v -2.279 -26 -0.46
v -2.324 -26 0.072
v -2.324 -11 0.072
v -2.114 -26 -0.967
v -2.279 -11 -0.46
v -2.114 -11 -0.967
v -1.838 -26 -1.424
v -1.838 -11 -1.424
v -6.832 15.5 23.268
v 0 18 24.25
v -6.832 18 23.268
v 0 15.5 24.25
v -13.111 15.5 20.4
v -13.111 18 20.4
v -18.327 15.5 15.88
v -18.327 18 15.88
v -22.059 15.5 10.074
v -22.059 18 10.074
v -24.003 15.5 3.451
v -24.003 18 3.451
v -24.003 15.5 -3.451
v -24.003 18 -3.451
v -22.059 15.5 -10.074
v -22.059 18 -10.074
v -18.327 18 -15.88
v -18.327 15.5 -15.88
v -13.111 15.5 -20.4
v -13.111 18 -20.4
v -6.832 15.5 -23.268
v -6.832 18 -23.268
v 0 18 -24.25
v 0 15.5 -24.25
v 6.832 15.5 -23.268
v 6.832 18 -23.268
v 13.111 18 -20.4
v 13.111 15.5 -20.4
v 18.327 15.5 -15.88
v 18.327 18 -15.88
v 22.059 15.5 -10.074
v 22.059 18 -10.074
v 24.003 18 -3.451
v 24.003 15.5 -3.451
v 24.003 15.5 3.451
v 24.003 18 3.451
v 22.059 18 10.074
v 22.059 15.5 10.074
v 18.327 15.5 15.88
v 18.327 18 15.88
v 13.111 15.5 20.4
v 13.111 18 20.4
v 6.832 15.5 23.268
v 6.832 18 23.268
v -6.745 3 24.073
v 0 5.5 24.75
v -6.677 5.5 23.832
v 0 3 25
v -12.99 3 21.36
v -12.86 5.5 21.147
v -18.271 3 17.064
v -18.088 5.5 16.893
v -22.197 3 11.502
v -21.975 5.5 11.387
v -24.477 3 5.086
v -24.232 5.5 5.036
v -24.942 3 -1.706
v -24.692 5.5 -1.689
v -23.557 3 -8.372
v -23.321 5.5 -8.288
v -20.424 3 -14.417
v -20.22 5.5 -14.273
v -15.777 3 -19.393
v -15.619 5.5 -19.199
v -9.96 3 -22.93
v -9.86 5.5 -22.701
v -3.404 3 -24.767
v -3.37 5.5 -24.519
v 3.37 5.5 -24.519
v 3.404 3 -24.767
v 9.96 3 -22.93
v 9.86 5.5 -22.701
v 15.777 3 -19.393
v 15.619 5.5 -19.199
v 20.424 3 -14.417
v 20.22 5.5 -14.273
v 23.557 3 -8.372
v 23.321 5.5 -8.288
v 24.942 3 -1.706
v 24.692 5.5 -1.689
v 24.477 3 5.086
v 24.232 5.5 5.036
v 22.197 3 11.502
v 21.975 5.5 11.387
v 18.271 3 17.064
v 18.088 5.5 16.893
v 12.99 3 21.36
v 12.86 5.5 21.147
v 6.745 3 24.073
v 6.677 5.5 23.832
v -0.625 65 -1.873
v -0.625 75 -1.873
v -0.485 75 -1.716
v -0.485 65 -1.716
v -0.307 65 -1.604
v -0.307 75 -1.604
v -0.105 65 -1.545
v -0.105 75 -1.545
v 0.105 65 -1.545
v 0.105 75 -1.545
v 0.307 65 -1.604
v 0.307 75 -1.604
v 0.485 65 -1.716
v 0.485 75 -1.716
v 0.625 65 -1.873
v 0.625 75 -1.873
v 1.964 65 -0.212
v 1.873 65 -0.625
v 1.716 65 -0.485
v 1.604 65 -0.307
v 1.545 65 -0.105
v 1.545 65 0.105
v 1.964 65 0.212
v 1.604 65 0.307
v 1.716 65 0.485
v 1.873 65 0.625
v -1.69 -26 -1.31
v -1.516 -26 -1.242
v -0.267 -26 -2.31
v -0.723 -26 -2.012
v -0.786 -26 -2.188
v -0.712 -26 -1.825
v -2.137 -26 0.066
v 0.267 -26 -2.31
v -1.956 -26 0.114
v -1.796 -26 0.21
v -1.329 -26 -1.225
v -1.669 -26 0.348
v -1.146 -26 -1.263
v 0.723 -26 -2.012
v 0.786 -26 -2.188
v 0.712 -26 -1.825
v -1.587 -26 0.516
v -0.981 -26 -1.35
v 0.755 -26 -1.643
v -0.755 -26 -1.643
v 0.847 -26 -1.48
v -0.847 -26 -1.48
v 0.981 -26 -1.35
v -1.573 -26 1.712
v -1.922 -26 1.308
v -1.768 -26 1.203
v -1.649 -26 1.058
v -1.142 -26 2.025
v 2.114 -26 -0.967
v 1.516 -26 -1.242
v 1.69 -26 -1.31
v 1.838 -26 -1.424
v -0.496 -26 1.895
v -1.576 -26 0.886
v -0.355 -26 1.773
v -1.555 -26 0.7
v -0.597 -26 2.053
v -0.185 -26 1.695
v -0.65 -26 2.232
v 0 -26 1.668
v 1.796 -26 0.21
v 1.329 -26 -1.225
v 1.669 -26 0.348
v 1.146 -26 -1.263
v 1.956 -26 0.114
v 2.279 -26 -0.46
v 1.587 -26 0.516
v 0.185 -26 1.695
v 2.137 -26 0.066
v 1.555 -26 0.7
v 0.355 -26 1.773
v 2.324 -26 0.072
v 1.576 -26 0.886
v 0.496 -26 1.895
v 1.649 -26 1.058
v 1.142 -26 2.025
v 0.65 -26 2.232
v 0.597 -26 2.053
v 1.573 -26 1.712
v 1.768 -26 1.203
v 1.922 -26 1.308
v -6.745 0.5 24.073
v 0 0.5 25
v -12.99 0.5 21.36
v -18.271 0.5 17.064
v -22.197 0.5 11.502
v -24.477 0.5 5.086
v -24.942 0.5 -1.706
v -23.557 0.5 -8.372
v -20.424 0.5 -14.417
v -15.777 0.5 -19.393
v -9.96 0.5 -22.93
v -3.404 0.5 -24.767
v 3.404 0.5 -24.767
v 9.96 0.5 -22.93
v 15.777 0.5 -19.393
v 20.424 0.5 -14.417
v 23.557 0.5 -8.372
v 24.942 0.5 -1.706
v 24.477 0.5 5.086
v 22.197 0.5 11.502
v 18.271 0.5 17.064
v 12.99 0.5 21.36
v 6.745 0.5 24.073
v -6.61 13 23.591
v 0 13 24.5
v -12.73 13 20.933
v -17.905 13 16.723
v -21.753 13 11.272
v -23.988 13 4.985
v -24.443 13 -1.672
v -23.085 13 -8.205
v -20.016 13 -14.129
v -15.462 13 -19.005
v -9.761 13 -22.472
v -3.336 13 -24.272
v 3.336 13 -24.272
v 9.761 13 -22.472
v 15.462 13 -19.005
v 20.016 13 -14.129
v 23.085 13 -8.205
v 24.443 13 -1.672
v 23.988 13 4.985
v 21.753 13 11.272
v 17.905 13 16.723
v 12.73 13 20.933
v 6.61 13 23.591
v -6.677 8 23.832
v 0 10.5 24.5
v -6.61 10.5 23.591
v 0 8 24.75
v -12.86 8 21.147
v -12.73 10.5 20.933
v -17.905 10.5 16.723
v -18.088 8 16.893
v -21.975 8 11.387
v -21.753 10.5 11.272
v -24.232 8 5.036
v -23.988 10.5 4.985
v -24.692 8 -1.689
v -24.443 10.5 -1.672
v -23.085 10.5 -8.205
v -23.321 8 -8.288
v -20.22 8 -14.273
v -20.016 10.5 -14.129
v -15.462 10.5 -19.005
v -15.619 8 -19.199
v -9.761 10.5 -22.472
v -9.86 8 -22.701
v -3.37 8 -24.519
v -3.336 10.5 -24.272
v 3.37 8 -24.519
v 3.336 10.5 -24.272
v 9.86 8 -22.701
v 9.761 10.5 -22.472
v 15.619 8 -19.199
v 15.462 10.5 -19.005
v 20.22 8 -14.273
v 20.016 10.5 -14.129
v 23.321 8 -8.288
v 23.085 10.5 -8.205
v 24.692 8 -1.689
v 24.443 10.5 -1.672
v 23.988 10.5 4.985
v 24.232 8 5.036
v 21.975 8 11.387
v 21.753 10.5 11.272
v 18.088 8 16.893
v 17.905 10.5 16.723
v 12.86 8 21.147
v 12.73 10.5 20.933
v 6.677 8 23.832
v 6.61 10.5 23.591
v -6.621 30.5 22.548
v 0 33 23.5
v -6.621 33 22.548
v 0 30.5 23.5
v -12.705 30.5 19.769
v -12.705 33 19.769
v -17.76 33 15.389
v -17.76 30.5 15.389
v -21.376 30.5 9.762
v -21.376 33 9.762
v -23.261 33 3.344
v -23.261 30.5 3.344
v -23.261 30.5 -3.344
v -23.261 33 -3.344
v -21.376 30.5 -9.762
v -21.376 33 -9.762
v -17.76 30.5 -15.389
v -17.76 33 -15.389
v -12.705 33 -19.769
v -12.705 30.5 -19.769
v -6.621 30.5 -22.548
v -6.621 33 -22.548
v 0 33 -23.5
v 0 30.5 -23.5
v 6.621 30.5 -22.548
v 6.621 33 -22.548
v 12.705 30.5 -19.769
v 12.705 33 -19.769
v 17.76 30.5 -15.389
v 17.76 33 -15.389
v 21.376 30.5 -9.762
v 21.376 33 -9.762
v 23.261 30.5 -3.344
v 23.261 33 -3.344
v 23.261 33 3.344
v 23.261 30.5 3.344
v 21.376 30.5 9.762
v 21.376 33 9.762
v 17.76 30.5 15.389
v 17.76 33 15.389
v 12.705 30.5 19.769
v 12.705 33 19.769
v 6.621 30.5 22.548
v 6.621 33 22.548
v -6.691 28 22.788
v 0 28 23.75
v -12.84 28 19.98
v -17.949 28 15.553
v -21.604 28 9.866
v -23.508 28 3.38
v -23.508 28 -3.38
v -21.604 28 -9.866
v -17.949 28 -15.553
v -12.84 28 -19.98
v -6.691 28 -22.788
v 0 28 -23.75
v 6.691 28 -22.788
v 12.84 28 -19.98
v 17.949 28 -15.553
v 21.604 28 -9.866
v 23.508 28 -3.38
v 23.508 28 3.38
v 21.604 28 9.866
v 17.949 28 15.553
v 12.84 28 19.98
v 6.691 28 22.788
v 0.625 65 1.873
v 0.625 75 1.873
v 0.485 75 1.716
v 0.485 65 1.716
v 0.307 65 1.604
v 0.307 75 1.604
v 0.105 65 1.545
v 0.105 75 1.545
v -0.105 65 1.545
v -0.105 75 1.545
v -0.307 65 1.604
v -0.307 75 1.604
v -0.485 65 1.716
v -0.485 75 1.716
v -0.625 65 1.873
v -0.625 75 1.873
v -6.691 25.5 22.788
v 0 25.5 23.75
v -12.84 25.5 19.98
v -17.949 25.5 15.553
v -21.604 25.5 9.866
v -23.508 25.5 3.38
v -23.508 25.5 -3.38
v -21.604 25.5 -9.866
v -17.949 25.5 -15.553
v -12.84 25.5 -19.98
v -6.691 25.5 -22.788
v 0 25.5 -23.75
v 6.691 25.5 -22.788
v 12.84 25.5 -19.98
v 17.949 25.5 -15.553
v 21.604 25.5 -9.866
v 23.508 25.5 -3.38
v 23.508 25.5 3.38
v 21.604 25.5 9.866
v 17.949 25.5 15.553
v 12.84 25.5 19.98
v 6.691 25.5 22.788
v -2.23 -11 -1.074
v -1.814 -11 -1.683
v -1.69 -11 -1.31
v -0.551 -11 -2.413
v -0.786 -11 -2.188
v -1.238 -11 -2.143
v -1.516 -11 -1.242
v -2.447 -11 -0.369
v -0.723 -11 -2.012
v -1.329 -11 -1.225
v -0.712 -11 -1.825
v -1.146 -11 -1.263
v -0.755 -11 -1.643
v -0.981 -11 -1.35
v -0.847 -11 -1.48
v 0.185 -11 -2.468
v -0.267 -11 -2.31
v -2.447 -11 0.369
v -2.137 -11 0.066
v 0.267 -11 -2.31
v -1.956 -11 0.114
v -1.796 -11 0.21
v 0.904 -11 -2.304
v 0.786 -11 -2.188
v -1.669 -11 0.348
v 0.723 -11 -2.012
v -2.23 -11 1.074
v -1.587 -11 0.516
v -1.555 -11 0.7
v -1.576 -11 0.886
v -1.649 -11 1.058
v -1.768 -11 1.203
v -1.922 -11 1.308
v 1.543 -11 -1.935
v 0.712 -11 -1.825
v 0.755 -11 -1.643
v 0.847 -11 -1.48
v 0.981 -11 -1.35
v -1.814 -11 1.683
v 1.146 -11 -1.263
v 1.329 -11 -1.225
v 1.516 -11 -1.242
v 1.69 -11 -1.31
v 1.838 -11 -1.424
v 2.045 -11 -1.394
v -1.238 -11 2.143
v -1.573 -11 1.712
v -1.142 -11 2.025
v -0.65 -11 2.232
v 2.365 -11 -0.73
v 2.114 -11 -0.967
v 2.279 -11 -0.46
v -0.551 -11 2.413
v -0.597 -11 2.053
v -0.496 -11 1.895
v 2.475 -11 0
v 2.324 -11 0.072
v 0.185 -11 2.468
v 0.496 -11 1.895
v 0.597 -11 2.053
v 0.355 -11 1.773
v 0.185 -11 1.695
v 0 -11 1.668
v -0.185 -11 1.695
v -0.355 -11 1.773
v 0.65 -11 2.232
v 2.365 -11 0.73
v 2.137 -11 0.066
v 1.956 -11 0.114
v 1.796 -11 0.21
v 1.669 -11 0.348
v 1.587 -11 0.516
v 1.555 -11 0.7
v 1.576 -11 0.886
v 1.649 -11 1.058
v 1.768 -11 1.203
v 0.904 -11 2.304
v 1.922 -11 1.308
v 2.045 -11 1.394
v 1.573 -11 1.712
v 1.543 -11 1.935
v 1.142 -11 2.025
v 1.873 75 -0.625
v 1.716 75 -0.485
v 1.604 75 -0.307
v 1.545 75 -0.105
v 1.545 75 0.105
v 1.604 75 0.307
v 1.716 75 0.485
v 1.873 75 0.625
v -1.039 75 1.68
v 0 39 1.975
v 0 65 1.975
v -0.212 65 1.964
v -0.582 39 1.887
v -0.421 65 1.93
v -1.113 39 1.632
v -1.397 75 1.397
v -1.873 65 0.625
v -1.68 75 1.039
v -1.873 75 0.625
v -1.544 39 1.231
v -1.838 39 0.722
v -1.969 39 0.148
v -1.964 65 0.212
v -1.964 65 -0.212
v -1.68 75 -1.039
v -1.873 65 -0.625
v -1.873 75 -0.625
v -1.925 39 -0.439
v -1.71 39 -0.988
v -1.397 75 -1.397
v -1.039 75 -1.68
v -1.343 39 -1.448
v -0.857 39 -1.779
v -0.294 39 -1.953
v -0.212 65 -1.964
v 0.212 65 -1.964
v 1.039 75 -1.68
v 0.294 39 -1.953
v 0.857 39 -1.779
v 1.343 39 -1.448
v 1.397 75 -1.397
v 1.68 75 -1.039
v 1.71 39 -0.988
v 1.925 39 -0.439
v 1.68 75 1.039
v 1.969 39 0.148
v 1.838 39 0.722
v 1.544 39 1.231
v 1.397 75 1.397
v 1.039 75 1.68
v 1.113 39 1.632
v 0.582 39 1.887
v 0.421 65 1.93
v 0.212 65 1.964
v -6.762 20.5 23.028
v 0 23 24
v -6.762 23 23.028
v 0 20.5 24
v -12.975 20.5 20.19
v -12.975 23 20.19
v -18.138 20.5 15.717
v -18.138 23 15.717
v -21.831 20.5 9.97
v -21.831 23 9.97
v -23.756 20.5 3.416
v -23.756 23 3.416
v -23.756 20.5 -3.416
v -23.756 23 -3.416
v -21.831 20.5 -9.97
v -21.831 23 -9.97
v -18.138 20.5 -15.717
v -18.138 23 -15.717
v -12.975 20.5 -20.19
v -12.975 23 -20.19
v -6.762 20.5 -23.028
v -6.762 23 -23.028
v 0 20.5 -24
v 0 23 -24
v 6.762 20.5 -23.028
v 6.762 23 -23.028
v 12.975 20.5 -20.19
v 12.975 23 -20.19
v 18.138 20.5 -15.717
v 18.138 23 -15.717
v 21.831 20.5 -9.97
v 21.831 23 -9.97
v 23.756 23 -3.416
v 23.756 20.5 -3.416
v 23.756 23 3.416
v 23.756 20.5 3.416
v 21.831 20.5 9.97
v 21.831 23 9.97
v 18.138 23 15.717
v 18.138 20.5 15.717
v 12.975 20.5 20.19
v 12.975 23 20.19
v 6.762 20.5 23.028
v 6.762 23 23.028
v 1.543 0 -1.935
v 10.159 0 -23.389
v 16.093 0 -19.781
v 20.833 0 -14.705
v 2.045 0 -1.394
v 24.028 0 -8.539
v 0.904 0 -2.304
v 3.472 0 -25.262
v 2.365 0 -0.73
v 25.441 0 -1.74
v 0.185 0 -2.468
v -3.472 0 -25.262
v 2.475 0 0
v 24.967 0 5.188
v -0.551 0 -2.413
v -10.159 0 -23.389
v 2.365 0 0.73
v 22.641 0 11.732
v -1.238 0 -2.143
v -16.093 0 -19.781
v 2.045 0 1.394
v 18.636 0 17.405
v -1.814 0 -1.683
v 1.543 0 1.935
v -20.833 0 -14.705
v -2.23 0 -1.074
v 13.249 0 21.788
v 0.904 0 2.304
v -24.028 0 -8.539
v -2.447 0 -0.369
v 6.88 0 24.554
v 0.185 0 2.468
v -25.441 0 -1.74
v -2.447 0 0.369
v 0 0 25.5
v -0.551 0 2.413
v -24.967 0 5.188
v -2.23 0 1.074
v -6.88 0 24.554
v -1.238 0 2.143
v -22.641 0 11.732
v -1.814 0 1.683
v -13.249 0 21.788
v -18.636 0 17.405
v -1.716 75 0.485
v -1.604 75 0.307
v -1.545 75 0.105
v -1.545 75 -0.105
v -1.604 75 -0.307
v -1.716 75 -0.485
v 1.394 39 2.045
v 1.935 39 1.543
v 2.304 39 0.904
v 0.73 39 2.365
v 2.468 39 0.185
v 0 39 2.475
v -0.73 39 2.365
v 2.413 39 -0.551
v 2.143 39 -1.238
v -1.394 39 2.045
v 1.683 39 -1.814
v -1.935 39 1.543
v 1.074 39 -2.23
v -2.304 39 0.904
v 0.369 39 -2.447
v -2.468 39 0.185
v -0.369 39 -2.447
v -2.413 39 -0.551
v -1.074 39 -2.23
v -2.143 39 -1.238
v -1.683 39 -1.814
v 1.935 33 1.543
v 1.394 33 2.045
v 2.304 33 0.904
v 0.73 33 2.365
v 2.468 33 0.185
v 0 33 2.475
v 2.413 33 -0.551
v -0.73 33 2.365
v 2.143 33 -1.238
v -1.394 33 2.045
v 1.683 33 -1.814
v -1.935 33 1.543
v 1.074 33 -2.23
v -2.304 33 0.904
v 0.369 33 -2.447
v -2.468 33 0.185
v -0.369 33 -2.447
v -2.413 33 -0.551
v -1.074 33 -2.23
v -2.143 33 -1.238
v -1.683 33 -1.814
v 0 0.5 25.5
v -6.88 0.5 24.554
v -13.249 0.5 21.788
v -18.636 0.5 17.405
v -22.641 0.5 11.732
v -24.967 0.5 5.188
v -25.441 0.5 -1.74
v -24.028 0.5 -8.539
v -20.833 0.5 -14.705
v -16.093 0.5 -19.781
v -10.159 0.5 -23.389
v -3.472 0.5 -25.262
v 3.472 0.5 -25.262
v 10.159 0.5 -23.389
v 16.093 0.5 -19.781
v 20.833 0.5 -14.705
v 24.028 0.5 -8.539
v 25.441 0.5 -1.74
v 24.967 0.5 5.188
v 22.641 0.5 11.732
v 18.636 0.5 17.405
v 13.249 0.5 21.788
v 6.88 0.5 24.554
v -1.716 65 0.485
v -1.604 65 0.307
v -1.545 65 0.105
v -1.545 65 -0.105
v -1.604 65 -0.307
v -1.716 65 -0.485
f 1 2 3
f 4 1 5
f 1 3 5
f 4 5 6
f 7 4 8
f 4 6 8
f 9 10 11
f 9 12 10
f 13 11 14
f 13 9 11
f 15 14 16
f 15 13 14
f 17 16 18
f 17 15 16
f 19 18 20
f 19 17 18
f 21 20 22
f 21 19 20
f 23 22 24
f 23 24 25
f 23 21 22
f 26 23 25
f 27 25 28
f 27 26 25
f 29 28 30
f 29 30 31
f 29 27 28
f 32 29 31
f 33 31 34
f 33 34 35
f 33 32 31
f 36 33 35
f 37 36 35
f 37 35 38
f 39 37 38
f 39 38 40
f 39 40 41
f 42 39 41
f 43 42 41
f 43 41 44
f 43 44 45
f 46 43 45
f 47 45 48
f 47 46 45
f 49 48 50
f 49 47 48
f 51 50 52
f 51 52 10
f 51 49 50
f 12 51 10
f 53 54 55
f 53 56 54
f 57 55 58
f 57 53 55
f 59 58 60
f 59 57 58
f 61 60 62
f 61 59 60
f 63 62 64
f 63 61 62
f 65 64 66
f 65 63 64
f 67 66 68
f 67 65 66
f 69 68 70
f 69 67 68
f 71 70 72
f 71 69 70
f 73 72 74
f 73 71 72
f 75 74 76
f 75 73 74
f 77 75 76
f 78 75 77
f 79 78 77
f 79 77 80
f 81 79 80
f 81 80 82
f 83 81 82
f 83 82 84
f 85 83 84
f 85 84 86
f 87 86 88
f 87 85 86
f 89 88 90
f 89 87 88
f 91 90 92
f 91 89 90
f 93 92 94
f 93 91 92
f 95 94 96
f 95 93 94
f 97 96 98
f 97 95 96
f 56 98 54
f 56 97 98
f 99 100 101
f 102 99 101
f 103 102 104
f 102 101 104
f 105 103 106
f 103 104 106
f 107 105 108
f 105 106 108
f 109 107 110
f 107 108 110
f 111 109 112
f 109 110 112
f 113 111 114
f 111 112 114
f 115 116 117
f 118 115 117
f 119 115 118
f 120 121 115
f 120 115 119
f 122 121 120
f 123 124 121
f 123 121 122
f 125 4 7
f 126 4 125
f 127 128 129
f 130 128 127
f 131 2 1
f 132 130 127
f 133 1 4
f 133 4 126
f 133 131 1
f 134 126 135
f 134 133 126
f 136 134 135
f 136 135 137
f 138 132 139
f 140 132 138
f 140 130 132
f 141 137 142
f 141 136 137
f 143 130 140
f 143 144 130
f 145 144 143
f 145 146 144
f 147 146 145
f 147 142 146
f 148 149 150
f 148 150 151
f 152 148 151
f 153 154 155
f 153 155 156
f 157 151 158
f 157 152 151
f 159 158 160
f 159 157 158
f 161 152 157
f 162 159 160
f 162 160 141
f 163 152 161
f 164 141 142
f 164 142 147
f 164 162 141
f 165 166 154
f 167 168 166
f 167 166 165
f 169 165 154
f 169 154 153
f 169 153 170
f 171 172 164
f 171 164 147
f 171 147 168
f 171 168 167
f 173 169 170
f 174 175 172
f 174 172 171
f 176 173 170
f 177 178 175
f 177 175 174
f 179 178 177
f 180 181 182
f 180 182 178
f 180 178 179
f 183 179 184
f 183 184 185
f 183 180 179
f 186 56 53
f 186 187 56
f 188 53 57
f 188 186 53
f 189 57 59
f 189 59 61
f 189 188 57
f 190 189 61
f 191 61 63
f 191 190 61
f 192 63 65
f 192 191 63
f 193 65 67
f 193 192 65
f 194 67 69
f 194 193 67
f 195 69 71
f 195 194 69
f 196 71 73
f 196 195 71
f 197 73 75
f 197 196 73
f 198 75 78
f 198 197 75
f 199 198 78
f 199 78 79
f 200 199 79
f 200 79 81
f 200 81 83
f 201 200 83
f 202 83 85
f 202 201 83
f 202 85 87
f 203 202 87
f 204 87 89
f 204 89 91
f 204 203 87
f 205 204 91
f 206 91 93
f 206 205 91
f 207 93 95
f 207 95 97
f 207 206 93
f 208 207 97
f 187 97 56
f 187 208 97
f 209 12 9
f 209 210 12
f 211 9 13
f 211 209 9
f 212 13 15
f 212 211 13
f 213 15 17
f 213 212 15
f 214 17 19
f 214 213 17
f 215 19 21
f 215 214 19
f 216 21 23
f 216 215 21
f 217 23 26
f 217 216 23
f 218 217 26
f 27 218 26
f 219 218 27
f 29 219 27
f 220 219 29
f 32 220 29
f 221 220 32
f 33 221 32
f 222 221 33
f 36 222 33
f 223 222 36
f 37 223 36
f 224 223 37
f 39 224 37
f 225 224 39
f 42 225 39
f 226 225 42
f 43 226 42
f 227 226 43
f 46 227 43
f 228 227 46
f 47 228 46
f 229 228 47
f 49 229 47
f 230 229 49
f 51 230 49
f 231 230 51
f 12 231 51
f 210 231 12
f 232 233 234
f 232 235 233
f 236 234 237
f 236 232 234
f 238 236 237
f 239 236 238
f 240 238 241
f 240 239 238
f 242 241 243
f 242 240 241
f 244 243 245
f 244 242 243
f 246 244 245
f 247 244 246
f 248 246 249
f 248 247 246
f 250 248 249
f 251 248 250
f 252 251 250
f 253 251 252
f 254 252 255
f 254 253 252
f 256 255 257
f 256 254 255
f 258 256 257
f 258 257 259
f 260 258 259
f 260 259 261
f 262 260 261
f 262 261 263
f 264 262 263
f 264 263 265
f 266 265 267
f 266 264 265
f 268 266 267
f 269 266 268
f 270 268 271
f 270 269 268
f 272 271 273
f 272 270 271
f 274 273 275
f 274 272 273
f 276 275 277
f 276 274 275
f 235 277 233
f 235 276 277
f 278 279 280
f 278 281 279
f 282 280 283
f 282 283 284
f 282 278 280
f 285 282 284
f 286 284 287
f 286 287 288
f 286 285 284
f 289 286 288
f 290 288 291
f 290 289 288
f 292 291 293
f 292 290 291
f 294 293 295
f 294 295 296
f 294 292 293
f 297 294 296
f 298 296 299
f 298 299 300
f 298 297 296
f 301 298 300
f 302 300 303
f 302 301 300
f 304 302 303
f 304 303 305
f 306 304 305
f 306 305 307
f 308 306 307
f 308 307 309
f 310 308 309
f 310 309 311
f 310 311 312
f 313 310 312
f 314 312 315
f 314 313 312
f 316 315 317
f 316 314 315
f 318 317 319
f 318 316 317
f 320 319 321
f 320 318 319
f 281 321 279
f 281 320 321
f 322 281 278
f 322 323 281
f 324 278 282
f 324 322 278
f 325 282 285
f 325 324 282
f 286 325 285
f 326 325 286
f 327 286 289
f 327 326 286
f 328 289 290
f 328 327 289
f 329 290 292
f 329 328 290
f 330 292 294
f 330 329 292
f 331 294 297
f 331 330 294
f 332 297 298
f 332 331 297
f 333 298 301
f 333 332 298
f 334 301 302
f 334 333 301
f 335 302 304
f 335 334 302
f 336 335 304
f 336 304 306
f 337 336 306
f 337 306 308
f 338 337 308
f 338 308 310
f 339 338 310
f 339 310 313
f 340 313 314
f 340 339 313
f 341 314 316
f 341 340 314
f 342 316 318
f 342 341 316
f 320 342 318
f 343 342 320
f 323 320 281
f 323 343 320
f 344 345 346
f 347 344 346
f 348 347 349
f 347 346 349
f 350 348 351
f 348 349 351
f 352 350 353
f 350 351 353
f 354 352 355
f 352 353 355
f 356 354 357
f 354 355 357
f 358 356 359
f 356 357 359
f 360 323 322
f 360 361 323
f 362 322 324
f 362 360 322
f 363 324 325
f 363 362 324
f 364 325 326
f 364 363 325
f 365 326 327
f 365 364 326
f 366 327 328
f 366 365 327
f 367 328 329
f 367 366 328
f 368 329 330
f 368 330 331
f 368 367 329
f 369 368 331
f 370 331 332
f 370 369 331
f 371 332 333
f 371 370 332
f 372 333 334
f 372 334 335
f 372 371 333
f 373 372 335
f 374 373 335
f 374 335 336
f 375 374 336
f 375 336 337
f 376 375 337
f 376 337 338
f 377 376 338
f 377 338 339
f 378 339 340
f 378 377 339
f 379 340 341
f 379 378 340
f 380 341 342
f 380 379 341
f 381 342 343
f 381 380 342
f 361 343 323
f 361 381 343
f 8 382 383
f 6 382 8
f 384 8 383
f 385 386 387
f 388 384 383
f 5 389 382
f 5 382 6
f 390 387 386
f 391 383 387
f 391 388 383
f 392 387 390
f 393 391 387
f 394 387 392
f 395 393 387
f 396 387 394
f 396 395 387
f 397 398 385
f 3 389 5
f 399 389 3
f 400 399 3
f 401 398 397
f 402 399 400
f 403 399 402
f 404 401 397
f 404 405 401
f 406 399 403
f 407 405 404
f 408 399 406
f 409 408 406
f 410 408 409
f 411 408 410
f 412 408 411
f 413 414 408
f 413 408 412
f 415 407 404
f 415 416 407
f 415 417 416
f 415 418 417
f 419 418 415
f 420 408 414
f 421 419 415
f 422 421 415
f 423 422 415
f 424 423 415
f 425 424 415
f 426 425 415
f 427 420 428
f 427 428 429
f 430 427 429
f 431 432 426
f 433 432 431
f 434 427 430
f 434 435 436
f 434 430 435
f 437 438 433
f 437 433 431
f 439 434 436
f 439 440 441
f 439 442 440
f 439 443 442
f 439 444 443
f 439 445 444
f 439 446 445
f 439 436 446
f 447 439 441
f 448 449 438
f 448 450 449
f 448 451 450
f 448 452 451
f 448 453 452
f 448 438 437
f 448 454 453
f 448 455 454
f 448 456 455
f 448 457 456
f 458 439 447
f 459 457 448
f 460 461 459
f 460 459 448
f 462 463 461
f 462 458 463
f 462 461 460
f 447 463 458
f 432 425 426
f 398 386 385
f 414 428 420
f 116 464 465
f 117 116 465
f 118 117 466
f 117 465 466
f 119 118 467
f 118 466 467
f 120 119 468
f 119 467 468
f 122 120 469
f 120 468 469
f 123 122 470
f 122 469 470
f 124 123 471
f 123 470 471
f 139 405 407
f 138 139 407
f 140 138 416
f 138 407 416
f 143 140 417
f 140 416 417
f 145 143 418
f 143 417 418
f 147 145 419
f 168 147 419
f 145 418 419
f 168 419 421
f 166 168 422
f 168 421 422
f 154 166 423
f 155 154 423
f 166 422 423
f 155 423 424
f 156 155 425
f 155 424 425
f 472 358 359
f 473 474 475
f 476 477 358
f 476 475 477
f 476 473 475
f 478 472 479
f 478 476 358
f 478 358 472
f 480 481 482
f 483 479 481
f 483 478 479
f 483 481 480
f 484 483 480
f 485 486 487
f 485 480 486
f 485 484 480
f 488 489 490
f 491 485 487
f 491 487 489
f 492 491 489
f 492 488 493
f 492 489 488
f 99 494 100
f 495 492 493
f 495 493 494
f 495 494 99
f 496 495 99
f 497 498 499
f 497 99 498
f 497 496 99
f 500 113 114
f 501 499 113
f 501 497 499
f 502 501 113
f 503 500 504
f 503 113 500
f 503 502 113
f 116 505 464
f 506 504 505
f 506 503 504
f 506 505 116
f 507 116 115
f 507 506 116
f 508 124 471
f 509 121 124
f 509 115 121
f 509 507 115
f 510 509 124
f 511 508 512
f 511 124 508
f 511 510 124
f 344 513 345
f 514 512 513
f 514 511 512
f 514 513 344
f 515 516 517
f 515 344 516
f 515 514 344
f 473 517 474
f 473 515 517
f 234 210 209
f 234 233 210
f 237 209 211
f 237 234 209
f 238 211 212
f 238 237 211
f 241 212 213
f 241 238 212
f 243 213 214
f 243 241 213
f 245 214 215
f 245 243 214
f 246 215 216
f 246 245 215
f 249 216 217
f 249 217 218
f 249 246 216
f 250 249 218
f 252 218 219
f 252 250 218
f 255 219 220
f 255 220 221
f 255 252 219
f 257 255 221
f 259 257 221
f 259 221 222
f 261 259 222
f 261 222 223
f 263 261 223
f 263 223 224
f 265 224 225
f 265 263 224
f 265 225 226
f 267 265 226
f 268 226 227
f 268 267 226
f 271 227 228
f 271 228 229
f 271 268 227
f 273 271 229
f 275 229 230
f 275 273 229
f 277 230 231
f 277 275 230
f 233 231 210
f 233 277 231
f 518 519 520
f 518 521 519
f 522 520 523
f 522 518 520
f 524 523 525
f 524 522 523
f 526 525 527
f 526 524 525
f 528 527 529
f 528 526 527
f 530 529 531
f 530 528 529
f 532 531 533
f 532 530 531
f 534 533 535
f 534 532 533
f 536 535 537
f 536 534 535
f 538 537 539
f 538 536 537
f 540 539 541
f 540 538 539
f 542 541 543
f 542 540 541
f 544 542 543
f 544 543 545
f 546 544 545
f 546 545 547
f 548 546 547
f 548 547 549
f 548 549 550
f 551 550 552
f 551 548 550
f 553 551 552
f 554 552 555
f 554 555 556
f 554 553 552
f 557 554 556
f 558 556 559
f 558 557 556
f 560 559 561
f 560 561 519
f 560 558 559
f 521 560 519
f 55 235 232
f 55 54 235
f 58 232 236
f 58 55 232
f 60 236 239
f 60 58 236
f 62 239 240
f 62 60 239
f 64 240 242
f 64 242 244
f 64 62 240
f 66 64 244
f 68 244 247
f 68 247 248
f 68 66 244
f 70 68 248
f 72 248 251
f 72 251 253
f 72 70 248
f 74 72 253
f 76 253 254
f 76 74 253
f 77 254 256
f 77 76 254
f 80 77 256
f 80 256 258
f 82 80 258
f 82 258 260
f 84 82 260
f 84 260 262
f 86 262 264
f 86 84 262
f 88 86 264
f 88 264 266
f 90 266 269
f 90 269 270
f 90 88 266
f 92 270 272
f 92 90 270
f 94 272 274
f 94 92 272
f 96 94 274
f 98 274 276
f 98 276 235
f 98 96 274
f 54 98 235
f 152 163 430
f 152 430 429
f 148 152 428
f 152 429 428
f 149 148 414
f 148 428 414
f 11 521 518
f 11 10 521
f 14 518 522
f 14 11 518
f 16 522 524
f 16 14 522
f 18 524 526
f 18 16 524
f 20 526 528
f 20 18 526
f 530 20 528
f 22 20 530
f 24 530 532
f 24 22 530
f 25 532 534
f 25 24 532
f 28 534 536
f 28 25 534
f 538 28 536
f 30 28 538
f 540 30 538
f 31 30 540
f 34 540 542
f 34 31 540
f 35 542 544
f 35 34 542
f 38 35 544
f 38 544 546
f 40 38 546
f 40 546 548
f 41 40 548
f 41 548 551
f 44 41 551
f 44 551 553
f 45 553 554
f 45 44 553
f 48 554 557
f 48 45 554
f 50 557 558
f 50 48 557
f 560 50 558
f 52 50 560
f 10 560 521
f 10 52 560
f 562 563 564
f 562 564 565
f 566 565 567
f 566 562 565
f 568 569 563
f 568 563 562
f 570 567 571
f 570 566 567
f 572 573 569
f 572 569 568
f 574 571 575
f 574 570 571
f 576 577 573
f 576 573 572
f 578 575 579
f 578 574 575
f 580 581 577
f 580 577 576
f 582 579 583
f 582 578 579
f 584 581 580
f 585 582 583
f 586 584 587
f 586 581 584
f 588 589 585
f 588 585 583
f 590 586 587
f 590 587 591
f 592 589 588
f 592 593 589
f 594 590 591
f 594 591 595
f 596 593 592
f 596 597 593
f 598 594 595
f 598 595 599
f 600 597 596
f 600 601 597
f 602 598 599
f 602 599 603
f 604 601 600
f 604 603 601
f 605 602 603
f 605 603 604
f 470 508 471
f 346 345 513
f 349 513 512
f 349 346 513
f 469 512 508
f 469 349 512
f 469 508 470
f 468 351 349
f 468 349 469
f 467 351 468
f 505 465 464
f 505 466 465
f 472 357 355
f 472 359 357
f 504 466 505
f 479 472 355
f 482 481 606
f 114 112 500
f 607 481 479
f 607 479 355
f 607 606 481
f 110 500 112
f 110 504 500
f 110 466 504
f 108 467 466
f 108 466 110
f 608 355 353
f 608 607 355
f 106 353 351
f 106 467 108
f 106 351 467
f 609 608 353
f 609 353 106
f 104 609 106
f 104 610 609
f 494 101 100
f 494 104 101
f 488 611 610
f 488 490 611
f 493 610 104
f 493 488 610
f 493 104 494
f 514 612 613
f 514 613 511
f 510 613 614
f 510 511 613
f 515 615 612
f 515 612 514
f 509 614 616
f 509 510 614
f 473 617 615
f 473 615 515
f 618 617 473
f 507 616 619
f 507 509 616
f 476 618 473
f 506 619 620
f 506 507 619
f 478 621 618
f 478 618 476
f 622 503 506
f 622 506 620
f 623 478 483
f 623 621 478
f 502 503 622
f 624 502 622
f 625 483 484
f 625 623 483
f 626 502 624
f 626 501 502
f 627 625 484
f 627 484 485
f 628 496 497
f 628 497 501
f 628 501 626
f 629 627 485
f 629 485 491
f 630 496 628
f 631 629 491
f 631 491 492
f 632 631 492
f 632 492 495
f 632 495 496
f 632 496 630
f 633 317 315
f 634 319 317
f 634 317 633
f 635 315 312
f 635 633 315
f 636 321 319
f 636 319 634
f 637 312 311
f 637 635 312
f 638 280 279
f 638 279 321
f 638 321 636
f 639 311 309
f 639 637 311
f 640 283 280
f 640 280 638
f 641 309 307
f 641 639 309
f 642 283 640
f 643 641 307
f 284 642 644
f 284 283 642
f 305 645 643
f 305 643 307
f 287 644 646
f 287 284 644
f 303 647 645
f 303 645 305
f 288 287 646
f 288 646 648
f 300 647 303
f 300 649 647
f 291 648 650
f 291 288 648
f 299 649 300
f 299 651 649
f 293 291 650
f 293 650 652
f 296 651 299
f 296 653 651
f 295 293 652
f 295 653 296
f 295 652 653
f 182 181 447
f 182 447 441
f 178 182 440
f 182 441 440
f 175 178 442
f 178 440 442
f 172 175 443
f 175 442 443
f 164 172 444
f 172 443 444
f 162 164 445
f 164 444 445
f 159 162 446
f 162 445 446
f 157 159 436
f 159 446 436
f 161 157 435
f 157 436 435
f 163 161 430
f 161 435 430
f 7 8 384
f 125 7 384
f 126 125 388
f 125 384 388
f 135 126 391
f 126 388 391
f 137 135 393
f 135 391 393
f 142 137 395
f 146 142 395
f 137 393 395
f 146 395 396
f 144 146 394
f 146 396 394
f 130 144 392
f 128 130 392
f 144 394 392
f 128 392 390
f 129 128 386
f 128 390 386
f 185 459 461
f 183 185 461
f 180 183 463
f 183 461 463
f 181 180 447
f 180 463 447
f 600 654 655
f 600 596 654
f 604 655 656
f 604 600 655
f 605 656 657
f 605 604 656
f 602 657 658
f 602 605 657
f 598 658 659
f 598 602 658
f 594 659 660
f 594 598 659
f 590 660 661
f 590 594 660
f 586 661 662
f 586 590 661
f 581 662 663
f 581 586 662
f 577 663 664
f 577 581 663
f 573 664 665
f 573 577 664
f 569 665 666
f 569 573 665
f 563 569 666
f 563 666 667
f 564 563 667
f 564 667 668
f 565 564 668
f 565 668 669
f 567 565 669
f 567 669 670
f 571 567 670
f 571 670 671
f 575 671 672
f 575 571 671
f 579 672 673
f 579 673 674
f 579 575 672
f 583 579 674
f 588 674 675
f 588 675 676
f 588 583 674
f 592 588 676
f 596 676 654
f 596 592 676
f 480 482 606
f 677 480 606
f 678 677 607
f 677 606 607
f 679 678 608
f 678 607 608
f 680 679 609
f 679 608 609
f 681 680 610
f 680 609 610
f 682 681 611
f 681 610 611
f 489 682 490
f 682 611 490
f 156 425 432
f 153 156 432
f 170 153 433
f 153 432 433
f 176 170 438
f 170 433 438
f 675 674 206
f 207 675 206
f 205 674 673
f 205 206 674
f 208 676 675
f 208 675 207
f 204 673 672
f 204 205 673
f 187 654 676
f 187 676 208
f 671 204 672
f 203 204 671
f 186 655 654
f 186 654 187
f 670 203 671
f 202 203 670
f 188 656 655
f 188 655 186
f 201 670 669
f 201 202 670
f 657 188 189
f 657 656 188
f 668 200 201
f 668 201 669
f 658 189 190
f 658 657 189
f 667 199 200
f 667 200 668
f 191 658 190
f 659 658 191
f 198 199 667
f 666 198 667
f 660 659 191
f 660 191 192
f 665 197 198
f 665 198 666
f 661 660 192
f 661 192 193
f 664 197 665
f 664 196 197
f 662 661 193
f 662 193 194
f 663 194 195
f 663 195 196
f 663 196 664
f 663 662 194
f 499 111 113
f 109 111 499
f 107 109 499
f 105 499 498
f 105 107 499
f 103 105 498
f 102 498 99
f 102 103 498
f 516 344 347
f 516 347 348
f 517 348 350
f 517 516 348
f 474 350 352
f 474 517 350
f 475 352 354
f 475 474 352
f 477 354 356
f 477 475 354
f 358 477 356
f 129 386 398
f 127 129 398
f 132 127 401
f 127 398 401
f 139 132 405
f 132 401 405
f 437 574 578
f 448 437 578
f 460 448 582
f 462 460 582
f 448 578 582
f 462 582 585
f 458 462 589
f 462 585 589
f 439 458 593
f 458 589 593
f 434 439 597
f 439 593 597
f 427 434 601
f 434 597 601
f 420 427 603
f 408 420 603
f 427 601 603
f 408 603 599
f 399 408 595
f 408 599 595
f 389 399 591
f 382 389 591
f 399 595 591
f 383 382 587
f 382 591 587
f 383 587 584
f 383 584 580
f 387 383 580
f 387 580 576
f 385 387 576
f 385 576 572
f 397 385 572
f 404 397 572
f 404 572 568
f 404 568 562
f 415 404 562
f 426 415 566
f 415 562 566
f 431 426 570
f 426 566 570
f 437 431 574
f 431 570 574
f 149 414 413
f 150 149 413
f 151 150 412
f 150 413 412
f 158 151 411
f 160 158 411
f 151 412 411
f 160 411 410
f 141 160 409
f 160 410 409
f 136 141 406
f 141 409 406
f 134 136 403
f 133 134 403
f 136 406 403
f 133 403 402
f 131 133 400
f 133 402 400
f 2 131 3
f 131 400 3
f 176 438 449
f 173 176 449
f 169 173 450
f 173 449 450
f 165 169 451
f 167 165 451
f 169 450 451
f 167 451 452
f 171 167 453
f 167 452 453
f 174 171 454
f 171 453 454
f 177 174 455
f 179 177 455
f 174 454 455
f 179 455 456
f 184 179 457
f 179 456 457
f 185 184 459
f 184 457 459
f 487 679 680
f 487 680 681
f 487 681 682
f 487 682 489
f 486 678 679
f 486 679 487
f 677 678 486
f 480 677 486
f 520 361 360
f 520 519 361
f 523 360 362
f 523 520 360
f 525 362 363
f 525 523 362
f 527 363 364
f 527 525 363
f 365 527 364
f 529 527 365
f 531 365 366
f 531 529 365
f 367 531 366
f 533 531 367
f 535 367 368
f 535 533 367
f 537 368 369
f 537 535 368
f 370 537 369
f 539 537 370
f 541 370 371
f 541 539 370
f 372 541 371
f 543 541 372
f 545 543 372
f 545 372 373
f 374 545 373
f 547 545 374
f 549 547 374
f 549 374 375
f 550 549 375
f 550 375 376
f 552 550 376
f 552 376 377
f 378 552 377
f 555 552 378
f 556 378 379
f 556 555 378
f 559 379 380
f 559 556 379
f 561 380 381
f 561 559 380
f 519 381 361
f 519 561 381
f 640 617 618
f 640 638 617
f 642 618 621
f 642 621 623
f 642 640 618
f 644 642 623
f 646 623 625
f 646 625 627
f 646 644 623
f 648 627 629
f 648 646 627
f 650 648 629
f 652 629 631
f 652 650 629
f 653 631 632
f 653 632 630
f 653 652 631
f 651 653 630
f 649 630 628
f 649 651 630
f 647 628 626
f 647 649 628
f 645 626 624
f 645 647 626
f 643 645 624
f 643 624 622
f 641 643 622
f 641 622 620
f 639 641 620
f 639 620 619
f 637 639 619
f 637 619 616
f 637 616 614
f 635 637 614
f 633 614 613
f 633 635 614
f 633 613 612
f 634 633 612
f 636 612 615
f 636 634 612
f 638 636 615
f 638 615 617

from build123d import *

# Parameters (mm, degrees)
F0_R     = 2.475
F1_DEPTH = 11
F3_DEPTH = 15
F7_DEPTH = 10


with BuildPart() as f1:
    # F0 (on Front) → F1 (new body)
    with BuildSketch(Plane.XZ):
        Circle(F0_R)
    extrude(amount=F1_DEPTH)

    # F2 (on face) → F3 (join)
    with BuildSketch(Plane.XZ.offset(11)):
        with BuildLine():
            ThreePointArc((0.65, 2.2322914236), (0, 1.66842184), (-0.65, 2.2322914236))
            ThreePointArc((-0.65, 2.2322914236), (-1.3666007116, 1.8809645119), (-1.9221742584, 1.3080027219))
            ThreePointArc((-1.9221742584, 1.3080027219), (-1.5867634629, 0.5155707024), (-2.3238963511, 0.0716292507))
            ThreePointArc((-2.3238963511, 0.0716292507), (-2.2112064004, -0.7184645119), (-1.837969024, -1.4239012841))
            ThreePointArc((-1.837969024, -1.4239012841), (-0.9806737522, -1.3497816224), (-0.7862469313, -2.1880221121))
            ThreePointArc((-0.7862469313, -2.1880221121), (0, -2.325), (0.7862469313, -2.1880221121))
            ThreePointArc((0.7862469313, -2.1880221121), (0.9806737522, -1.3497816224), (1.837969024, -1.4239012841))
            ThreePointArc((1.837969024, -1.4239012841), (2.2112064004, -0.7184645119), (2.3238963511, 0.0716292507))
            ThreePointArc((2.3238963511, 0.0716292507), (1.5867634629, 0.5155707024), (1.9221742584, 1.3080027219))
            ThreePointArc((1.9221742584, 1.3080027219), (1.3666007116, 1.8809645119), (0.65, 2.2322914236))
        make_face()
    extrude(amount=F3_DEPTH)

    # F4 (on Right) → F5 (revolve)
    with BuildSketch(Plane.YZ):
        Polygon((0, 25.5), (0, 0), (75, 0), (75, 1.975), (39, 1.975), (39, 2.475), (33, 2.475), (33, 23.5), (30.5, 23.5), (28, 23.75), (25.5, 23.75), (23, 24), (20.5, 24), (18, 24.25), (15.5, 24.25), (13, 24.5), (10.5, 24.5), (8, 24.75), (5.5, 24.75), (3, 25), (0.5, 25), (0.5, 25.5), align=None)
    revolve(axis=Axis((0, 0, 0), (0, -1, 0)))

    # F6 (on face) → F7 (cut)
    with BuildSketch(Plane(origin=(0, 75, 0), x_dir=(-1, 0, 0), z_dir=(0, 1, 0))):
        with BuildLine():
            ThreePointArc((0.625, 1.8734993995), (0, 1.975), (-0.625, 1.8734993995))
            ThreePointArc((-0.625, 1.8734993995), (0, 1.5380774983), (0.625, 1.8734993995))
        make_face()
        with BuildLine():
            ThreePointArc((-1.8734993995, 0.625), (-1.975, 0), (-1.8734993995, -0.625))
            ThreePointArc((-1.8734993995, -0.625), (-1.5380774983, 0), (-1.8734993995, 0.625))
        make_face()
        with BuildLine():
            ThreePointArc((-0.625, -1.8734993995), (0, -1.975), (0.625, -1.8734993995))
            ThreePointArc((0.625, -1.8734993995), (0, -1.5380774983), (-0.625, -1.8734993995))
        make_face()
        with BuildLine():
            ThreePointArc((1.8734993995, -0.625), (1.975, 0), (1.8734993995, 0.625))
            ThreePointArc((1.8734993995, 0.625), (1.5380774983, 0), (1.8734993995, -0.625))
        make_face()
    extrude(amount=-F7_DEPTH, mode=Mode.SUBTRACT)


solid = f1.part
